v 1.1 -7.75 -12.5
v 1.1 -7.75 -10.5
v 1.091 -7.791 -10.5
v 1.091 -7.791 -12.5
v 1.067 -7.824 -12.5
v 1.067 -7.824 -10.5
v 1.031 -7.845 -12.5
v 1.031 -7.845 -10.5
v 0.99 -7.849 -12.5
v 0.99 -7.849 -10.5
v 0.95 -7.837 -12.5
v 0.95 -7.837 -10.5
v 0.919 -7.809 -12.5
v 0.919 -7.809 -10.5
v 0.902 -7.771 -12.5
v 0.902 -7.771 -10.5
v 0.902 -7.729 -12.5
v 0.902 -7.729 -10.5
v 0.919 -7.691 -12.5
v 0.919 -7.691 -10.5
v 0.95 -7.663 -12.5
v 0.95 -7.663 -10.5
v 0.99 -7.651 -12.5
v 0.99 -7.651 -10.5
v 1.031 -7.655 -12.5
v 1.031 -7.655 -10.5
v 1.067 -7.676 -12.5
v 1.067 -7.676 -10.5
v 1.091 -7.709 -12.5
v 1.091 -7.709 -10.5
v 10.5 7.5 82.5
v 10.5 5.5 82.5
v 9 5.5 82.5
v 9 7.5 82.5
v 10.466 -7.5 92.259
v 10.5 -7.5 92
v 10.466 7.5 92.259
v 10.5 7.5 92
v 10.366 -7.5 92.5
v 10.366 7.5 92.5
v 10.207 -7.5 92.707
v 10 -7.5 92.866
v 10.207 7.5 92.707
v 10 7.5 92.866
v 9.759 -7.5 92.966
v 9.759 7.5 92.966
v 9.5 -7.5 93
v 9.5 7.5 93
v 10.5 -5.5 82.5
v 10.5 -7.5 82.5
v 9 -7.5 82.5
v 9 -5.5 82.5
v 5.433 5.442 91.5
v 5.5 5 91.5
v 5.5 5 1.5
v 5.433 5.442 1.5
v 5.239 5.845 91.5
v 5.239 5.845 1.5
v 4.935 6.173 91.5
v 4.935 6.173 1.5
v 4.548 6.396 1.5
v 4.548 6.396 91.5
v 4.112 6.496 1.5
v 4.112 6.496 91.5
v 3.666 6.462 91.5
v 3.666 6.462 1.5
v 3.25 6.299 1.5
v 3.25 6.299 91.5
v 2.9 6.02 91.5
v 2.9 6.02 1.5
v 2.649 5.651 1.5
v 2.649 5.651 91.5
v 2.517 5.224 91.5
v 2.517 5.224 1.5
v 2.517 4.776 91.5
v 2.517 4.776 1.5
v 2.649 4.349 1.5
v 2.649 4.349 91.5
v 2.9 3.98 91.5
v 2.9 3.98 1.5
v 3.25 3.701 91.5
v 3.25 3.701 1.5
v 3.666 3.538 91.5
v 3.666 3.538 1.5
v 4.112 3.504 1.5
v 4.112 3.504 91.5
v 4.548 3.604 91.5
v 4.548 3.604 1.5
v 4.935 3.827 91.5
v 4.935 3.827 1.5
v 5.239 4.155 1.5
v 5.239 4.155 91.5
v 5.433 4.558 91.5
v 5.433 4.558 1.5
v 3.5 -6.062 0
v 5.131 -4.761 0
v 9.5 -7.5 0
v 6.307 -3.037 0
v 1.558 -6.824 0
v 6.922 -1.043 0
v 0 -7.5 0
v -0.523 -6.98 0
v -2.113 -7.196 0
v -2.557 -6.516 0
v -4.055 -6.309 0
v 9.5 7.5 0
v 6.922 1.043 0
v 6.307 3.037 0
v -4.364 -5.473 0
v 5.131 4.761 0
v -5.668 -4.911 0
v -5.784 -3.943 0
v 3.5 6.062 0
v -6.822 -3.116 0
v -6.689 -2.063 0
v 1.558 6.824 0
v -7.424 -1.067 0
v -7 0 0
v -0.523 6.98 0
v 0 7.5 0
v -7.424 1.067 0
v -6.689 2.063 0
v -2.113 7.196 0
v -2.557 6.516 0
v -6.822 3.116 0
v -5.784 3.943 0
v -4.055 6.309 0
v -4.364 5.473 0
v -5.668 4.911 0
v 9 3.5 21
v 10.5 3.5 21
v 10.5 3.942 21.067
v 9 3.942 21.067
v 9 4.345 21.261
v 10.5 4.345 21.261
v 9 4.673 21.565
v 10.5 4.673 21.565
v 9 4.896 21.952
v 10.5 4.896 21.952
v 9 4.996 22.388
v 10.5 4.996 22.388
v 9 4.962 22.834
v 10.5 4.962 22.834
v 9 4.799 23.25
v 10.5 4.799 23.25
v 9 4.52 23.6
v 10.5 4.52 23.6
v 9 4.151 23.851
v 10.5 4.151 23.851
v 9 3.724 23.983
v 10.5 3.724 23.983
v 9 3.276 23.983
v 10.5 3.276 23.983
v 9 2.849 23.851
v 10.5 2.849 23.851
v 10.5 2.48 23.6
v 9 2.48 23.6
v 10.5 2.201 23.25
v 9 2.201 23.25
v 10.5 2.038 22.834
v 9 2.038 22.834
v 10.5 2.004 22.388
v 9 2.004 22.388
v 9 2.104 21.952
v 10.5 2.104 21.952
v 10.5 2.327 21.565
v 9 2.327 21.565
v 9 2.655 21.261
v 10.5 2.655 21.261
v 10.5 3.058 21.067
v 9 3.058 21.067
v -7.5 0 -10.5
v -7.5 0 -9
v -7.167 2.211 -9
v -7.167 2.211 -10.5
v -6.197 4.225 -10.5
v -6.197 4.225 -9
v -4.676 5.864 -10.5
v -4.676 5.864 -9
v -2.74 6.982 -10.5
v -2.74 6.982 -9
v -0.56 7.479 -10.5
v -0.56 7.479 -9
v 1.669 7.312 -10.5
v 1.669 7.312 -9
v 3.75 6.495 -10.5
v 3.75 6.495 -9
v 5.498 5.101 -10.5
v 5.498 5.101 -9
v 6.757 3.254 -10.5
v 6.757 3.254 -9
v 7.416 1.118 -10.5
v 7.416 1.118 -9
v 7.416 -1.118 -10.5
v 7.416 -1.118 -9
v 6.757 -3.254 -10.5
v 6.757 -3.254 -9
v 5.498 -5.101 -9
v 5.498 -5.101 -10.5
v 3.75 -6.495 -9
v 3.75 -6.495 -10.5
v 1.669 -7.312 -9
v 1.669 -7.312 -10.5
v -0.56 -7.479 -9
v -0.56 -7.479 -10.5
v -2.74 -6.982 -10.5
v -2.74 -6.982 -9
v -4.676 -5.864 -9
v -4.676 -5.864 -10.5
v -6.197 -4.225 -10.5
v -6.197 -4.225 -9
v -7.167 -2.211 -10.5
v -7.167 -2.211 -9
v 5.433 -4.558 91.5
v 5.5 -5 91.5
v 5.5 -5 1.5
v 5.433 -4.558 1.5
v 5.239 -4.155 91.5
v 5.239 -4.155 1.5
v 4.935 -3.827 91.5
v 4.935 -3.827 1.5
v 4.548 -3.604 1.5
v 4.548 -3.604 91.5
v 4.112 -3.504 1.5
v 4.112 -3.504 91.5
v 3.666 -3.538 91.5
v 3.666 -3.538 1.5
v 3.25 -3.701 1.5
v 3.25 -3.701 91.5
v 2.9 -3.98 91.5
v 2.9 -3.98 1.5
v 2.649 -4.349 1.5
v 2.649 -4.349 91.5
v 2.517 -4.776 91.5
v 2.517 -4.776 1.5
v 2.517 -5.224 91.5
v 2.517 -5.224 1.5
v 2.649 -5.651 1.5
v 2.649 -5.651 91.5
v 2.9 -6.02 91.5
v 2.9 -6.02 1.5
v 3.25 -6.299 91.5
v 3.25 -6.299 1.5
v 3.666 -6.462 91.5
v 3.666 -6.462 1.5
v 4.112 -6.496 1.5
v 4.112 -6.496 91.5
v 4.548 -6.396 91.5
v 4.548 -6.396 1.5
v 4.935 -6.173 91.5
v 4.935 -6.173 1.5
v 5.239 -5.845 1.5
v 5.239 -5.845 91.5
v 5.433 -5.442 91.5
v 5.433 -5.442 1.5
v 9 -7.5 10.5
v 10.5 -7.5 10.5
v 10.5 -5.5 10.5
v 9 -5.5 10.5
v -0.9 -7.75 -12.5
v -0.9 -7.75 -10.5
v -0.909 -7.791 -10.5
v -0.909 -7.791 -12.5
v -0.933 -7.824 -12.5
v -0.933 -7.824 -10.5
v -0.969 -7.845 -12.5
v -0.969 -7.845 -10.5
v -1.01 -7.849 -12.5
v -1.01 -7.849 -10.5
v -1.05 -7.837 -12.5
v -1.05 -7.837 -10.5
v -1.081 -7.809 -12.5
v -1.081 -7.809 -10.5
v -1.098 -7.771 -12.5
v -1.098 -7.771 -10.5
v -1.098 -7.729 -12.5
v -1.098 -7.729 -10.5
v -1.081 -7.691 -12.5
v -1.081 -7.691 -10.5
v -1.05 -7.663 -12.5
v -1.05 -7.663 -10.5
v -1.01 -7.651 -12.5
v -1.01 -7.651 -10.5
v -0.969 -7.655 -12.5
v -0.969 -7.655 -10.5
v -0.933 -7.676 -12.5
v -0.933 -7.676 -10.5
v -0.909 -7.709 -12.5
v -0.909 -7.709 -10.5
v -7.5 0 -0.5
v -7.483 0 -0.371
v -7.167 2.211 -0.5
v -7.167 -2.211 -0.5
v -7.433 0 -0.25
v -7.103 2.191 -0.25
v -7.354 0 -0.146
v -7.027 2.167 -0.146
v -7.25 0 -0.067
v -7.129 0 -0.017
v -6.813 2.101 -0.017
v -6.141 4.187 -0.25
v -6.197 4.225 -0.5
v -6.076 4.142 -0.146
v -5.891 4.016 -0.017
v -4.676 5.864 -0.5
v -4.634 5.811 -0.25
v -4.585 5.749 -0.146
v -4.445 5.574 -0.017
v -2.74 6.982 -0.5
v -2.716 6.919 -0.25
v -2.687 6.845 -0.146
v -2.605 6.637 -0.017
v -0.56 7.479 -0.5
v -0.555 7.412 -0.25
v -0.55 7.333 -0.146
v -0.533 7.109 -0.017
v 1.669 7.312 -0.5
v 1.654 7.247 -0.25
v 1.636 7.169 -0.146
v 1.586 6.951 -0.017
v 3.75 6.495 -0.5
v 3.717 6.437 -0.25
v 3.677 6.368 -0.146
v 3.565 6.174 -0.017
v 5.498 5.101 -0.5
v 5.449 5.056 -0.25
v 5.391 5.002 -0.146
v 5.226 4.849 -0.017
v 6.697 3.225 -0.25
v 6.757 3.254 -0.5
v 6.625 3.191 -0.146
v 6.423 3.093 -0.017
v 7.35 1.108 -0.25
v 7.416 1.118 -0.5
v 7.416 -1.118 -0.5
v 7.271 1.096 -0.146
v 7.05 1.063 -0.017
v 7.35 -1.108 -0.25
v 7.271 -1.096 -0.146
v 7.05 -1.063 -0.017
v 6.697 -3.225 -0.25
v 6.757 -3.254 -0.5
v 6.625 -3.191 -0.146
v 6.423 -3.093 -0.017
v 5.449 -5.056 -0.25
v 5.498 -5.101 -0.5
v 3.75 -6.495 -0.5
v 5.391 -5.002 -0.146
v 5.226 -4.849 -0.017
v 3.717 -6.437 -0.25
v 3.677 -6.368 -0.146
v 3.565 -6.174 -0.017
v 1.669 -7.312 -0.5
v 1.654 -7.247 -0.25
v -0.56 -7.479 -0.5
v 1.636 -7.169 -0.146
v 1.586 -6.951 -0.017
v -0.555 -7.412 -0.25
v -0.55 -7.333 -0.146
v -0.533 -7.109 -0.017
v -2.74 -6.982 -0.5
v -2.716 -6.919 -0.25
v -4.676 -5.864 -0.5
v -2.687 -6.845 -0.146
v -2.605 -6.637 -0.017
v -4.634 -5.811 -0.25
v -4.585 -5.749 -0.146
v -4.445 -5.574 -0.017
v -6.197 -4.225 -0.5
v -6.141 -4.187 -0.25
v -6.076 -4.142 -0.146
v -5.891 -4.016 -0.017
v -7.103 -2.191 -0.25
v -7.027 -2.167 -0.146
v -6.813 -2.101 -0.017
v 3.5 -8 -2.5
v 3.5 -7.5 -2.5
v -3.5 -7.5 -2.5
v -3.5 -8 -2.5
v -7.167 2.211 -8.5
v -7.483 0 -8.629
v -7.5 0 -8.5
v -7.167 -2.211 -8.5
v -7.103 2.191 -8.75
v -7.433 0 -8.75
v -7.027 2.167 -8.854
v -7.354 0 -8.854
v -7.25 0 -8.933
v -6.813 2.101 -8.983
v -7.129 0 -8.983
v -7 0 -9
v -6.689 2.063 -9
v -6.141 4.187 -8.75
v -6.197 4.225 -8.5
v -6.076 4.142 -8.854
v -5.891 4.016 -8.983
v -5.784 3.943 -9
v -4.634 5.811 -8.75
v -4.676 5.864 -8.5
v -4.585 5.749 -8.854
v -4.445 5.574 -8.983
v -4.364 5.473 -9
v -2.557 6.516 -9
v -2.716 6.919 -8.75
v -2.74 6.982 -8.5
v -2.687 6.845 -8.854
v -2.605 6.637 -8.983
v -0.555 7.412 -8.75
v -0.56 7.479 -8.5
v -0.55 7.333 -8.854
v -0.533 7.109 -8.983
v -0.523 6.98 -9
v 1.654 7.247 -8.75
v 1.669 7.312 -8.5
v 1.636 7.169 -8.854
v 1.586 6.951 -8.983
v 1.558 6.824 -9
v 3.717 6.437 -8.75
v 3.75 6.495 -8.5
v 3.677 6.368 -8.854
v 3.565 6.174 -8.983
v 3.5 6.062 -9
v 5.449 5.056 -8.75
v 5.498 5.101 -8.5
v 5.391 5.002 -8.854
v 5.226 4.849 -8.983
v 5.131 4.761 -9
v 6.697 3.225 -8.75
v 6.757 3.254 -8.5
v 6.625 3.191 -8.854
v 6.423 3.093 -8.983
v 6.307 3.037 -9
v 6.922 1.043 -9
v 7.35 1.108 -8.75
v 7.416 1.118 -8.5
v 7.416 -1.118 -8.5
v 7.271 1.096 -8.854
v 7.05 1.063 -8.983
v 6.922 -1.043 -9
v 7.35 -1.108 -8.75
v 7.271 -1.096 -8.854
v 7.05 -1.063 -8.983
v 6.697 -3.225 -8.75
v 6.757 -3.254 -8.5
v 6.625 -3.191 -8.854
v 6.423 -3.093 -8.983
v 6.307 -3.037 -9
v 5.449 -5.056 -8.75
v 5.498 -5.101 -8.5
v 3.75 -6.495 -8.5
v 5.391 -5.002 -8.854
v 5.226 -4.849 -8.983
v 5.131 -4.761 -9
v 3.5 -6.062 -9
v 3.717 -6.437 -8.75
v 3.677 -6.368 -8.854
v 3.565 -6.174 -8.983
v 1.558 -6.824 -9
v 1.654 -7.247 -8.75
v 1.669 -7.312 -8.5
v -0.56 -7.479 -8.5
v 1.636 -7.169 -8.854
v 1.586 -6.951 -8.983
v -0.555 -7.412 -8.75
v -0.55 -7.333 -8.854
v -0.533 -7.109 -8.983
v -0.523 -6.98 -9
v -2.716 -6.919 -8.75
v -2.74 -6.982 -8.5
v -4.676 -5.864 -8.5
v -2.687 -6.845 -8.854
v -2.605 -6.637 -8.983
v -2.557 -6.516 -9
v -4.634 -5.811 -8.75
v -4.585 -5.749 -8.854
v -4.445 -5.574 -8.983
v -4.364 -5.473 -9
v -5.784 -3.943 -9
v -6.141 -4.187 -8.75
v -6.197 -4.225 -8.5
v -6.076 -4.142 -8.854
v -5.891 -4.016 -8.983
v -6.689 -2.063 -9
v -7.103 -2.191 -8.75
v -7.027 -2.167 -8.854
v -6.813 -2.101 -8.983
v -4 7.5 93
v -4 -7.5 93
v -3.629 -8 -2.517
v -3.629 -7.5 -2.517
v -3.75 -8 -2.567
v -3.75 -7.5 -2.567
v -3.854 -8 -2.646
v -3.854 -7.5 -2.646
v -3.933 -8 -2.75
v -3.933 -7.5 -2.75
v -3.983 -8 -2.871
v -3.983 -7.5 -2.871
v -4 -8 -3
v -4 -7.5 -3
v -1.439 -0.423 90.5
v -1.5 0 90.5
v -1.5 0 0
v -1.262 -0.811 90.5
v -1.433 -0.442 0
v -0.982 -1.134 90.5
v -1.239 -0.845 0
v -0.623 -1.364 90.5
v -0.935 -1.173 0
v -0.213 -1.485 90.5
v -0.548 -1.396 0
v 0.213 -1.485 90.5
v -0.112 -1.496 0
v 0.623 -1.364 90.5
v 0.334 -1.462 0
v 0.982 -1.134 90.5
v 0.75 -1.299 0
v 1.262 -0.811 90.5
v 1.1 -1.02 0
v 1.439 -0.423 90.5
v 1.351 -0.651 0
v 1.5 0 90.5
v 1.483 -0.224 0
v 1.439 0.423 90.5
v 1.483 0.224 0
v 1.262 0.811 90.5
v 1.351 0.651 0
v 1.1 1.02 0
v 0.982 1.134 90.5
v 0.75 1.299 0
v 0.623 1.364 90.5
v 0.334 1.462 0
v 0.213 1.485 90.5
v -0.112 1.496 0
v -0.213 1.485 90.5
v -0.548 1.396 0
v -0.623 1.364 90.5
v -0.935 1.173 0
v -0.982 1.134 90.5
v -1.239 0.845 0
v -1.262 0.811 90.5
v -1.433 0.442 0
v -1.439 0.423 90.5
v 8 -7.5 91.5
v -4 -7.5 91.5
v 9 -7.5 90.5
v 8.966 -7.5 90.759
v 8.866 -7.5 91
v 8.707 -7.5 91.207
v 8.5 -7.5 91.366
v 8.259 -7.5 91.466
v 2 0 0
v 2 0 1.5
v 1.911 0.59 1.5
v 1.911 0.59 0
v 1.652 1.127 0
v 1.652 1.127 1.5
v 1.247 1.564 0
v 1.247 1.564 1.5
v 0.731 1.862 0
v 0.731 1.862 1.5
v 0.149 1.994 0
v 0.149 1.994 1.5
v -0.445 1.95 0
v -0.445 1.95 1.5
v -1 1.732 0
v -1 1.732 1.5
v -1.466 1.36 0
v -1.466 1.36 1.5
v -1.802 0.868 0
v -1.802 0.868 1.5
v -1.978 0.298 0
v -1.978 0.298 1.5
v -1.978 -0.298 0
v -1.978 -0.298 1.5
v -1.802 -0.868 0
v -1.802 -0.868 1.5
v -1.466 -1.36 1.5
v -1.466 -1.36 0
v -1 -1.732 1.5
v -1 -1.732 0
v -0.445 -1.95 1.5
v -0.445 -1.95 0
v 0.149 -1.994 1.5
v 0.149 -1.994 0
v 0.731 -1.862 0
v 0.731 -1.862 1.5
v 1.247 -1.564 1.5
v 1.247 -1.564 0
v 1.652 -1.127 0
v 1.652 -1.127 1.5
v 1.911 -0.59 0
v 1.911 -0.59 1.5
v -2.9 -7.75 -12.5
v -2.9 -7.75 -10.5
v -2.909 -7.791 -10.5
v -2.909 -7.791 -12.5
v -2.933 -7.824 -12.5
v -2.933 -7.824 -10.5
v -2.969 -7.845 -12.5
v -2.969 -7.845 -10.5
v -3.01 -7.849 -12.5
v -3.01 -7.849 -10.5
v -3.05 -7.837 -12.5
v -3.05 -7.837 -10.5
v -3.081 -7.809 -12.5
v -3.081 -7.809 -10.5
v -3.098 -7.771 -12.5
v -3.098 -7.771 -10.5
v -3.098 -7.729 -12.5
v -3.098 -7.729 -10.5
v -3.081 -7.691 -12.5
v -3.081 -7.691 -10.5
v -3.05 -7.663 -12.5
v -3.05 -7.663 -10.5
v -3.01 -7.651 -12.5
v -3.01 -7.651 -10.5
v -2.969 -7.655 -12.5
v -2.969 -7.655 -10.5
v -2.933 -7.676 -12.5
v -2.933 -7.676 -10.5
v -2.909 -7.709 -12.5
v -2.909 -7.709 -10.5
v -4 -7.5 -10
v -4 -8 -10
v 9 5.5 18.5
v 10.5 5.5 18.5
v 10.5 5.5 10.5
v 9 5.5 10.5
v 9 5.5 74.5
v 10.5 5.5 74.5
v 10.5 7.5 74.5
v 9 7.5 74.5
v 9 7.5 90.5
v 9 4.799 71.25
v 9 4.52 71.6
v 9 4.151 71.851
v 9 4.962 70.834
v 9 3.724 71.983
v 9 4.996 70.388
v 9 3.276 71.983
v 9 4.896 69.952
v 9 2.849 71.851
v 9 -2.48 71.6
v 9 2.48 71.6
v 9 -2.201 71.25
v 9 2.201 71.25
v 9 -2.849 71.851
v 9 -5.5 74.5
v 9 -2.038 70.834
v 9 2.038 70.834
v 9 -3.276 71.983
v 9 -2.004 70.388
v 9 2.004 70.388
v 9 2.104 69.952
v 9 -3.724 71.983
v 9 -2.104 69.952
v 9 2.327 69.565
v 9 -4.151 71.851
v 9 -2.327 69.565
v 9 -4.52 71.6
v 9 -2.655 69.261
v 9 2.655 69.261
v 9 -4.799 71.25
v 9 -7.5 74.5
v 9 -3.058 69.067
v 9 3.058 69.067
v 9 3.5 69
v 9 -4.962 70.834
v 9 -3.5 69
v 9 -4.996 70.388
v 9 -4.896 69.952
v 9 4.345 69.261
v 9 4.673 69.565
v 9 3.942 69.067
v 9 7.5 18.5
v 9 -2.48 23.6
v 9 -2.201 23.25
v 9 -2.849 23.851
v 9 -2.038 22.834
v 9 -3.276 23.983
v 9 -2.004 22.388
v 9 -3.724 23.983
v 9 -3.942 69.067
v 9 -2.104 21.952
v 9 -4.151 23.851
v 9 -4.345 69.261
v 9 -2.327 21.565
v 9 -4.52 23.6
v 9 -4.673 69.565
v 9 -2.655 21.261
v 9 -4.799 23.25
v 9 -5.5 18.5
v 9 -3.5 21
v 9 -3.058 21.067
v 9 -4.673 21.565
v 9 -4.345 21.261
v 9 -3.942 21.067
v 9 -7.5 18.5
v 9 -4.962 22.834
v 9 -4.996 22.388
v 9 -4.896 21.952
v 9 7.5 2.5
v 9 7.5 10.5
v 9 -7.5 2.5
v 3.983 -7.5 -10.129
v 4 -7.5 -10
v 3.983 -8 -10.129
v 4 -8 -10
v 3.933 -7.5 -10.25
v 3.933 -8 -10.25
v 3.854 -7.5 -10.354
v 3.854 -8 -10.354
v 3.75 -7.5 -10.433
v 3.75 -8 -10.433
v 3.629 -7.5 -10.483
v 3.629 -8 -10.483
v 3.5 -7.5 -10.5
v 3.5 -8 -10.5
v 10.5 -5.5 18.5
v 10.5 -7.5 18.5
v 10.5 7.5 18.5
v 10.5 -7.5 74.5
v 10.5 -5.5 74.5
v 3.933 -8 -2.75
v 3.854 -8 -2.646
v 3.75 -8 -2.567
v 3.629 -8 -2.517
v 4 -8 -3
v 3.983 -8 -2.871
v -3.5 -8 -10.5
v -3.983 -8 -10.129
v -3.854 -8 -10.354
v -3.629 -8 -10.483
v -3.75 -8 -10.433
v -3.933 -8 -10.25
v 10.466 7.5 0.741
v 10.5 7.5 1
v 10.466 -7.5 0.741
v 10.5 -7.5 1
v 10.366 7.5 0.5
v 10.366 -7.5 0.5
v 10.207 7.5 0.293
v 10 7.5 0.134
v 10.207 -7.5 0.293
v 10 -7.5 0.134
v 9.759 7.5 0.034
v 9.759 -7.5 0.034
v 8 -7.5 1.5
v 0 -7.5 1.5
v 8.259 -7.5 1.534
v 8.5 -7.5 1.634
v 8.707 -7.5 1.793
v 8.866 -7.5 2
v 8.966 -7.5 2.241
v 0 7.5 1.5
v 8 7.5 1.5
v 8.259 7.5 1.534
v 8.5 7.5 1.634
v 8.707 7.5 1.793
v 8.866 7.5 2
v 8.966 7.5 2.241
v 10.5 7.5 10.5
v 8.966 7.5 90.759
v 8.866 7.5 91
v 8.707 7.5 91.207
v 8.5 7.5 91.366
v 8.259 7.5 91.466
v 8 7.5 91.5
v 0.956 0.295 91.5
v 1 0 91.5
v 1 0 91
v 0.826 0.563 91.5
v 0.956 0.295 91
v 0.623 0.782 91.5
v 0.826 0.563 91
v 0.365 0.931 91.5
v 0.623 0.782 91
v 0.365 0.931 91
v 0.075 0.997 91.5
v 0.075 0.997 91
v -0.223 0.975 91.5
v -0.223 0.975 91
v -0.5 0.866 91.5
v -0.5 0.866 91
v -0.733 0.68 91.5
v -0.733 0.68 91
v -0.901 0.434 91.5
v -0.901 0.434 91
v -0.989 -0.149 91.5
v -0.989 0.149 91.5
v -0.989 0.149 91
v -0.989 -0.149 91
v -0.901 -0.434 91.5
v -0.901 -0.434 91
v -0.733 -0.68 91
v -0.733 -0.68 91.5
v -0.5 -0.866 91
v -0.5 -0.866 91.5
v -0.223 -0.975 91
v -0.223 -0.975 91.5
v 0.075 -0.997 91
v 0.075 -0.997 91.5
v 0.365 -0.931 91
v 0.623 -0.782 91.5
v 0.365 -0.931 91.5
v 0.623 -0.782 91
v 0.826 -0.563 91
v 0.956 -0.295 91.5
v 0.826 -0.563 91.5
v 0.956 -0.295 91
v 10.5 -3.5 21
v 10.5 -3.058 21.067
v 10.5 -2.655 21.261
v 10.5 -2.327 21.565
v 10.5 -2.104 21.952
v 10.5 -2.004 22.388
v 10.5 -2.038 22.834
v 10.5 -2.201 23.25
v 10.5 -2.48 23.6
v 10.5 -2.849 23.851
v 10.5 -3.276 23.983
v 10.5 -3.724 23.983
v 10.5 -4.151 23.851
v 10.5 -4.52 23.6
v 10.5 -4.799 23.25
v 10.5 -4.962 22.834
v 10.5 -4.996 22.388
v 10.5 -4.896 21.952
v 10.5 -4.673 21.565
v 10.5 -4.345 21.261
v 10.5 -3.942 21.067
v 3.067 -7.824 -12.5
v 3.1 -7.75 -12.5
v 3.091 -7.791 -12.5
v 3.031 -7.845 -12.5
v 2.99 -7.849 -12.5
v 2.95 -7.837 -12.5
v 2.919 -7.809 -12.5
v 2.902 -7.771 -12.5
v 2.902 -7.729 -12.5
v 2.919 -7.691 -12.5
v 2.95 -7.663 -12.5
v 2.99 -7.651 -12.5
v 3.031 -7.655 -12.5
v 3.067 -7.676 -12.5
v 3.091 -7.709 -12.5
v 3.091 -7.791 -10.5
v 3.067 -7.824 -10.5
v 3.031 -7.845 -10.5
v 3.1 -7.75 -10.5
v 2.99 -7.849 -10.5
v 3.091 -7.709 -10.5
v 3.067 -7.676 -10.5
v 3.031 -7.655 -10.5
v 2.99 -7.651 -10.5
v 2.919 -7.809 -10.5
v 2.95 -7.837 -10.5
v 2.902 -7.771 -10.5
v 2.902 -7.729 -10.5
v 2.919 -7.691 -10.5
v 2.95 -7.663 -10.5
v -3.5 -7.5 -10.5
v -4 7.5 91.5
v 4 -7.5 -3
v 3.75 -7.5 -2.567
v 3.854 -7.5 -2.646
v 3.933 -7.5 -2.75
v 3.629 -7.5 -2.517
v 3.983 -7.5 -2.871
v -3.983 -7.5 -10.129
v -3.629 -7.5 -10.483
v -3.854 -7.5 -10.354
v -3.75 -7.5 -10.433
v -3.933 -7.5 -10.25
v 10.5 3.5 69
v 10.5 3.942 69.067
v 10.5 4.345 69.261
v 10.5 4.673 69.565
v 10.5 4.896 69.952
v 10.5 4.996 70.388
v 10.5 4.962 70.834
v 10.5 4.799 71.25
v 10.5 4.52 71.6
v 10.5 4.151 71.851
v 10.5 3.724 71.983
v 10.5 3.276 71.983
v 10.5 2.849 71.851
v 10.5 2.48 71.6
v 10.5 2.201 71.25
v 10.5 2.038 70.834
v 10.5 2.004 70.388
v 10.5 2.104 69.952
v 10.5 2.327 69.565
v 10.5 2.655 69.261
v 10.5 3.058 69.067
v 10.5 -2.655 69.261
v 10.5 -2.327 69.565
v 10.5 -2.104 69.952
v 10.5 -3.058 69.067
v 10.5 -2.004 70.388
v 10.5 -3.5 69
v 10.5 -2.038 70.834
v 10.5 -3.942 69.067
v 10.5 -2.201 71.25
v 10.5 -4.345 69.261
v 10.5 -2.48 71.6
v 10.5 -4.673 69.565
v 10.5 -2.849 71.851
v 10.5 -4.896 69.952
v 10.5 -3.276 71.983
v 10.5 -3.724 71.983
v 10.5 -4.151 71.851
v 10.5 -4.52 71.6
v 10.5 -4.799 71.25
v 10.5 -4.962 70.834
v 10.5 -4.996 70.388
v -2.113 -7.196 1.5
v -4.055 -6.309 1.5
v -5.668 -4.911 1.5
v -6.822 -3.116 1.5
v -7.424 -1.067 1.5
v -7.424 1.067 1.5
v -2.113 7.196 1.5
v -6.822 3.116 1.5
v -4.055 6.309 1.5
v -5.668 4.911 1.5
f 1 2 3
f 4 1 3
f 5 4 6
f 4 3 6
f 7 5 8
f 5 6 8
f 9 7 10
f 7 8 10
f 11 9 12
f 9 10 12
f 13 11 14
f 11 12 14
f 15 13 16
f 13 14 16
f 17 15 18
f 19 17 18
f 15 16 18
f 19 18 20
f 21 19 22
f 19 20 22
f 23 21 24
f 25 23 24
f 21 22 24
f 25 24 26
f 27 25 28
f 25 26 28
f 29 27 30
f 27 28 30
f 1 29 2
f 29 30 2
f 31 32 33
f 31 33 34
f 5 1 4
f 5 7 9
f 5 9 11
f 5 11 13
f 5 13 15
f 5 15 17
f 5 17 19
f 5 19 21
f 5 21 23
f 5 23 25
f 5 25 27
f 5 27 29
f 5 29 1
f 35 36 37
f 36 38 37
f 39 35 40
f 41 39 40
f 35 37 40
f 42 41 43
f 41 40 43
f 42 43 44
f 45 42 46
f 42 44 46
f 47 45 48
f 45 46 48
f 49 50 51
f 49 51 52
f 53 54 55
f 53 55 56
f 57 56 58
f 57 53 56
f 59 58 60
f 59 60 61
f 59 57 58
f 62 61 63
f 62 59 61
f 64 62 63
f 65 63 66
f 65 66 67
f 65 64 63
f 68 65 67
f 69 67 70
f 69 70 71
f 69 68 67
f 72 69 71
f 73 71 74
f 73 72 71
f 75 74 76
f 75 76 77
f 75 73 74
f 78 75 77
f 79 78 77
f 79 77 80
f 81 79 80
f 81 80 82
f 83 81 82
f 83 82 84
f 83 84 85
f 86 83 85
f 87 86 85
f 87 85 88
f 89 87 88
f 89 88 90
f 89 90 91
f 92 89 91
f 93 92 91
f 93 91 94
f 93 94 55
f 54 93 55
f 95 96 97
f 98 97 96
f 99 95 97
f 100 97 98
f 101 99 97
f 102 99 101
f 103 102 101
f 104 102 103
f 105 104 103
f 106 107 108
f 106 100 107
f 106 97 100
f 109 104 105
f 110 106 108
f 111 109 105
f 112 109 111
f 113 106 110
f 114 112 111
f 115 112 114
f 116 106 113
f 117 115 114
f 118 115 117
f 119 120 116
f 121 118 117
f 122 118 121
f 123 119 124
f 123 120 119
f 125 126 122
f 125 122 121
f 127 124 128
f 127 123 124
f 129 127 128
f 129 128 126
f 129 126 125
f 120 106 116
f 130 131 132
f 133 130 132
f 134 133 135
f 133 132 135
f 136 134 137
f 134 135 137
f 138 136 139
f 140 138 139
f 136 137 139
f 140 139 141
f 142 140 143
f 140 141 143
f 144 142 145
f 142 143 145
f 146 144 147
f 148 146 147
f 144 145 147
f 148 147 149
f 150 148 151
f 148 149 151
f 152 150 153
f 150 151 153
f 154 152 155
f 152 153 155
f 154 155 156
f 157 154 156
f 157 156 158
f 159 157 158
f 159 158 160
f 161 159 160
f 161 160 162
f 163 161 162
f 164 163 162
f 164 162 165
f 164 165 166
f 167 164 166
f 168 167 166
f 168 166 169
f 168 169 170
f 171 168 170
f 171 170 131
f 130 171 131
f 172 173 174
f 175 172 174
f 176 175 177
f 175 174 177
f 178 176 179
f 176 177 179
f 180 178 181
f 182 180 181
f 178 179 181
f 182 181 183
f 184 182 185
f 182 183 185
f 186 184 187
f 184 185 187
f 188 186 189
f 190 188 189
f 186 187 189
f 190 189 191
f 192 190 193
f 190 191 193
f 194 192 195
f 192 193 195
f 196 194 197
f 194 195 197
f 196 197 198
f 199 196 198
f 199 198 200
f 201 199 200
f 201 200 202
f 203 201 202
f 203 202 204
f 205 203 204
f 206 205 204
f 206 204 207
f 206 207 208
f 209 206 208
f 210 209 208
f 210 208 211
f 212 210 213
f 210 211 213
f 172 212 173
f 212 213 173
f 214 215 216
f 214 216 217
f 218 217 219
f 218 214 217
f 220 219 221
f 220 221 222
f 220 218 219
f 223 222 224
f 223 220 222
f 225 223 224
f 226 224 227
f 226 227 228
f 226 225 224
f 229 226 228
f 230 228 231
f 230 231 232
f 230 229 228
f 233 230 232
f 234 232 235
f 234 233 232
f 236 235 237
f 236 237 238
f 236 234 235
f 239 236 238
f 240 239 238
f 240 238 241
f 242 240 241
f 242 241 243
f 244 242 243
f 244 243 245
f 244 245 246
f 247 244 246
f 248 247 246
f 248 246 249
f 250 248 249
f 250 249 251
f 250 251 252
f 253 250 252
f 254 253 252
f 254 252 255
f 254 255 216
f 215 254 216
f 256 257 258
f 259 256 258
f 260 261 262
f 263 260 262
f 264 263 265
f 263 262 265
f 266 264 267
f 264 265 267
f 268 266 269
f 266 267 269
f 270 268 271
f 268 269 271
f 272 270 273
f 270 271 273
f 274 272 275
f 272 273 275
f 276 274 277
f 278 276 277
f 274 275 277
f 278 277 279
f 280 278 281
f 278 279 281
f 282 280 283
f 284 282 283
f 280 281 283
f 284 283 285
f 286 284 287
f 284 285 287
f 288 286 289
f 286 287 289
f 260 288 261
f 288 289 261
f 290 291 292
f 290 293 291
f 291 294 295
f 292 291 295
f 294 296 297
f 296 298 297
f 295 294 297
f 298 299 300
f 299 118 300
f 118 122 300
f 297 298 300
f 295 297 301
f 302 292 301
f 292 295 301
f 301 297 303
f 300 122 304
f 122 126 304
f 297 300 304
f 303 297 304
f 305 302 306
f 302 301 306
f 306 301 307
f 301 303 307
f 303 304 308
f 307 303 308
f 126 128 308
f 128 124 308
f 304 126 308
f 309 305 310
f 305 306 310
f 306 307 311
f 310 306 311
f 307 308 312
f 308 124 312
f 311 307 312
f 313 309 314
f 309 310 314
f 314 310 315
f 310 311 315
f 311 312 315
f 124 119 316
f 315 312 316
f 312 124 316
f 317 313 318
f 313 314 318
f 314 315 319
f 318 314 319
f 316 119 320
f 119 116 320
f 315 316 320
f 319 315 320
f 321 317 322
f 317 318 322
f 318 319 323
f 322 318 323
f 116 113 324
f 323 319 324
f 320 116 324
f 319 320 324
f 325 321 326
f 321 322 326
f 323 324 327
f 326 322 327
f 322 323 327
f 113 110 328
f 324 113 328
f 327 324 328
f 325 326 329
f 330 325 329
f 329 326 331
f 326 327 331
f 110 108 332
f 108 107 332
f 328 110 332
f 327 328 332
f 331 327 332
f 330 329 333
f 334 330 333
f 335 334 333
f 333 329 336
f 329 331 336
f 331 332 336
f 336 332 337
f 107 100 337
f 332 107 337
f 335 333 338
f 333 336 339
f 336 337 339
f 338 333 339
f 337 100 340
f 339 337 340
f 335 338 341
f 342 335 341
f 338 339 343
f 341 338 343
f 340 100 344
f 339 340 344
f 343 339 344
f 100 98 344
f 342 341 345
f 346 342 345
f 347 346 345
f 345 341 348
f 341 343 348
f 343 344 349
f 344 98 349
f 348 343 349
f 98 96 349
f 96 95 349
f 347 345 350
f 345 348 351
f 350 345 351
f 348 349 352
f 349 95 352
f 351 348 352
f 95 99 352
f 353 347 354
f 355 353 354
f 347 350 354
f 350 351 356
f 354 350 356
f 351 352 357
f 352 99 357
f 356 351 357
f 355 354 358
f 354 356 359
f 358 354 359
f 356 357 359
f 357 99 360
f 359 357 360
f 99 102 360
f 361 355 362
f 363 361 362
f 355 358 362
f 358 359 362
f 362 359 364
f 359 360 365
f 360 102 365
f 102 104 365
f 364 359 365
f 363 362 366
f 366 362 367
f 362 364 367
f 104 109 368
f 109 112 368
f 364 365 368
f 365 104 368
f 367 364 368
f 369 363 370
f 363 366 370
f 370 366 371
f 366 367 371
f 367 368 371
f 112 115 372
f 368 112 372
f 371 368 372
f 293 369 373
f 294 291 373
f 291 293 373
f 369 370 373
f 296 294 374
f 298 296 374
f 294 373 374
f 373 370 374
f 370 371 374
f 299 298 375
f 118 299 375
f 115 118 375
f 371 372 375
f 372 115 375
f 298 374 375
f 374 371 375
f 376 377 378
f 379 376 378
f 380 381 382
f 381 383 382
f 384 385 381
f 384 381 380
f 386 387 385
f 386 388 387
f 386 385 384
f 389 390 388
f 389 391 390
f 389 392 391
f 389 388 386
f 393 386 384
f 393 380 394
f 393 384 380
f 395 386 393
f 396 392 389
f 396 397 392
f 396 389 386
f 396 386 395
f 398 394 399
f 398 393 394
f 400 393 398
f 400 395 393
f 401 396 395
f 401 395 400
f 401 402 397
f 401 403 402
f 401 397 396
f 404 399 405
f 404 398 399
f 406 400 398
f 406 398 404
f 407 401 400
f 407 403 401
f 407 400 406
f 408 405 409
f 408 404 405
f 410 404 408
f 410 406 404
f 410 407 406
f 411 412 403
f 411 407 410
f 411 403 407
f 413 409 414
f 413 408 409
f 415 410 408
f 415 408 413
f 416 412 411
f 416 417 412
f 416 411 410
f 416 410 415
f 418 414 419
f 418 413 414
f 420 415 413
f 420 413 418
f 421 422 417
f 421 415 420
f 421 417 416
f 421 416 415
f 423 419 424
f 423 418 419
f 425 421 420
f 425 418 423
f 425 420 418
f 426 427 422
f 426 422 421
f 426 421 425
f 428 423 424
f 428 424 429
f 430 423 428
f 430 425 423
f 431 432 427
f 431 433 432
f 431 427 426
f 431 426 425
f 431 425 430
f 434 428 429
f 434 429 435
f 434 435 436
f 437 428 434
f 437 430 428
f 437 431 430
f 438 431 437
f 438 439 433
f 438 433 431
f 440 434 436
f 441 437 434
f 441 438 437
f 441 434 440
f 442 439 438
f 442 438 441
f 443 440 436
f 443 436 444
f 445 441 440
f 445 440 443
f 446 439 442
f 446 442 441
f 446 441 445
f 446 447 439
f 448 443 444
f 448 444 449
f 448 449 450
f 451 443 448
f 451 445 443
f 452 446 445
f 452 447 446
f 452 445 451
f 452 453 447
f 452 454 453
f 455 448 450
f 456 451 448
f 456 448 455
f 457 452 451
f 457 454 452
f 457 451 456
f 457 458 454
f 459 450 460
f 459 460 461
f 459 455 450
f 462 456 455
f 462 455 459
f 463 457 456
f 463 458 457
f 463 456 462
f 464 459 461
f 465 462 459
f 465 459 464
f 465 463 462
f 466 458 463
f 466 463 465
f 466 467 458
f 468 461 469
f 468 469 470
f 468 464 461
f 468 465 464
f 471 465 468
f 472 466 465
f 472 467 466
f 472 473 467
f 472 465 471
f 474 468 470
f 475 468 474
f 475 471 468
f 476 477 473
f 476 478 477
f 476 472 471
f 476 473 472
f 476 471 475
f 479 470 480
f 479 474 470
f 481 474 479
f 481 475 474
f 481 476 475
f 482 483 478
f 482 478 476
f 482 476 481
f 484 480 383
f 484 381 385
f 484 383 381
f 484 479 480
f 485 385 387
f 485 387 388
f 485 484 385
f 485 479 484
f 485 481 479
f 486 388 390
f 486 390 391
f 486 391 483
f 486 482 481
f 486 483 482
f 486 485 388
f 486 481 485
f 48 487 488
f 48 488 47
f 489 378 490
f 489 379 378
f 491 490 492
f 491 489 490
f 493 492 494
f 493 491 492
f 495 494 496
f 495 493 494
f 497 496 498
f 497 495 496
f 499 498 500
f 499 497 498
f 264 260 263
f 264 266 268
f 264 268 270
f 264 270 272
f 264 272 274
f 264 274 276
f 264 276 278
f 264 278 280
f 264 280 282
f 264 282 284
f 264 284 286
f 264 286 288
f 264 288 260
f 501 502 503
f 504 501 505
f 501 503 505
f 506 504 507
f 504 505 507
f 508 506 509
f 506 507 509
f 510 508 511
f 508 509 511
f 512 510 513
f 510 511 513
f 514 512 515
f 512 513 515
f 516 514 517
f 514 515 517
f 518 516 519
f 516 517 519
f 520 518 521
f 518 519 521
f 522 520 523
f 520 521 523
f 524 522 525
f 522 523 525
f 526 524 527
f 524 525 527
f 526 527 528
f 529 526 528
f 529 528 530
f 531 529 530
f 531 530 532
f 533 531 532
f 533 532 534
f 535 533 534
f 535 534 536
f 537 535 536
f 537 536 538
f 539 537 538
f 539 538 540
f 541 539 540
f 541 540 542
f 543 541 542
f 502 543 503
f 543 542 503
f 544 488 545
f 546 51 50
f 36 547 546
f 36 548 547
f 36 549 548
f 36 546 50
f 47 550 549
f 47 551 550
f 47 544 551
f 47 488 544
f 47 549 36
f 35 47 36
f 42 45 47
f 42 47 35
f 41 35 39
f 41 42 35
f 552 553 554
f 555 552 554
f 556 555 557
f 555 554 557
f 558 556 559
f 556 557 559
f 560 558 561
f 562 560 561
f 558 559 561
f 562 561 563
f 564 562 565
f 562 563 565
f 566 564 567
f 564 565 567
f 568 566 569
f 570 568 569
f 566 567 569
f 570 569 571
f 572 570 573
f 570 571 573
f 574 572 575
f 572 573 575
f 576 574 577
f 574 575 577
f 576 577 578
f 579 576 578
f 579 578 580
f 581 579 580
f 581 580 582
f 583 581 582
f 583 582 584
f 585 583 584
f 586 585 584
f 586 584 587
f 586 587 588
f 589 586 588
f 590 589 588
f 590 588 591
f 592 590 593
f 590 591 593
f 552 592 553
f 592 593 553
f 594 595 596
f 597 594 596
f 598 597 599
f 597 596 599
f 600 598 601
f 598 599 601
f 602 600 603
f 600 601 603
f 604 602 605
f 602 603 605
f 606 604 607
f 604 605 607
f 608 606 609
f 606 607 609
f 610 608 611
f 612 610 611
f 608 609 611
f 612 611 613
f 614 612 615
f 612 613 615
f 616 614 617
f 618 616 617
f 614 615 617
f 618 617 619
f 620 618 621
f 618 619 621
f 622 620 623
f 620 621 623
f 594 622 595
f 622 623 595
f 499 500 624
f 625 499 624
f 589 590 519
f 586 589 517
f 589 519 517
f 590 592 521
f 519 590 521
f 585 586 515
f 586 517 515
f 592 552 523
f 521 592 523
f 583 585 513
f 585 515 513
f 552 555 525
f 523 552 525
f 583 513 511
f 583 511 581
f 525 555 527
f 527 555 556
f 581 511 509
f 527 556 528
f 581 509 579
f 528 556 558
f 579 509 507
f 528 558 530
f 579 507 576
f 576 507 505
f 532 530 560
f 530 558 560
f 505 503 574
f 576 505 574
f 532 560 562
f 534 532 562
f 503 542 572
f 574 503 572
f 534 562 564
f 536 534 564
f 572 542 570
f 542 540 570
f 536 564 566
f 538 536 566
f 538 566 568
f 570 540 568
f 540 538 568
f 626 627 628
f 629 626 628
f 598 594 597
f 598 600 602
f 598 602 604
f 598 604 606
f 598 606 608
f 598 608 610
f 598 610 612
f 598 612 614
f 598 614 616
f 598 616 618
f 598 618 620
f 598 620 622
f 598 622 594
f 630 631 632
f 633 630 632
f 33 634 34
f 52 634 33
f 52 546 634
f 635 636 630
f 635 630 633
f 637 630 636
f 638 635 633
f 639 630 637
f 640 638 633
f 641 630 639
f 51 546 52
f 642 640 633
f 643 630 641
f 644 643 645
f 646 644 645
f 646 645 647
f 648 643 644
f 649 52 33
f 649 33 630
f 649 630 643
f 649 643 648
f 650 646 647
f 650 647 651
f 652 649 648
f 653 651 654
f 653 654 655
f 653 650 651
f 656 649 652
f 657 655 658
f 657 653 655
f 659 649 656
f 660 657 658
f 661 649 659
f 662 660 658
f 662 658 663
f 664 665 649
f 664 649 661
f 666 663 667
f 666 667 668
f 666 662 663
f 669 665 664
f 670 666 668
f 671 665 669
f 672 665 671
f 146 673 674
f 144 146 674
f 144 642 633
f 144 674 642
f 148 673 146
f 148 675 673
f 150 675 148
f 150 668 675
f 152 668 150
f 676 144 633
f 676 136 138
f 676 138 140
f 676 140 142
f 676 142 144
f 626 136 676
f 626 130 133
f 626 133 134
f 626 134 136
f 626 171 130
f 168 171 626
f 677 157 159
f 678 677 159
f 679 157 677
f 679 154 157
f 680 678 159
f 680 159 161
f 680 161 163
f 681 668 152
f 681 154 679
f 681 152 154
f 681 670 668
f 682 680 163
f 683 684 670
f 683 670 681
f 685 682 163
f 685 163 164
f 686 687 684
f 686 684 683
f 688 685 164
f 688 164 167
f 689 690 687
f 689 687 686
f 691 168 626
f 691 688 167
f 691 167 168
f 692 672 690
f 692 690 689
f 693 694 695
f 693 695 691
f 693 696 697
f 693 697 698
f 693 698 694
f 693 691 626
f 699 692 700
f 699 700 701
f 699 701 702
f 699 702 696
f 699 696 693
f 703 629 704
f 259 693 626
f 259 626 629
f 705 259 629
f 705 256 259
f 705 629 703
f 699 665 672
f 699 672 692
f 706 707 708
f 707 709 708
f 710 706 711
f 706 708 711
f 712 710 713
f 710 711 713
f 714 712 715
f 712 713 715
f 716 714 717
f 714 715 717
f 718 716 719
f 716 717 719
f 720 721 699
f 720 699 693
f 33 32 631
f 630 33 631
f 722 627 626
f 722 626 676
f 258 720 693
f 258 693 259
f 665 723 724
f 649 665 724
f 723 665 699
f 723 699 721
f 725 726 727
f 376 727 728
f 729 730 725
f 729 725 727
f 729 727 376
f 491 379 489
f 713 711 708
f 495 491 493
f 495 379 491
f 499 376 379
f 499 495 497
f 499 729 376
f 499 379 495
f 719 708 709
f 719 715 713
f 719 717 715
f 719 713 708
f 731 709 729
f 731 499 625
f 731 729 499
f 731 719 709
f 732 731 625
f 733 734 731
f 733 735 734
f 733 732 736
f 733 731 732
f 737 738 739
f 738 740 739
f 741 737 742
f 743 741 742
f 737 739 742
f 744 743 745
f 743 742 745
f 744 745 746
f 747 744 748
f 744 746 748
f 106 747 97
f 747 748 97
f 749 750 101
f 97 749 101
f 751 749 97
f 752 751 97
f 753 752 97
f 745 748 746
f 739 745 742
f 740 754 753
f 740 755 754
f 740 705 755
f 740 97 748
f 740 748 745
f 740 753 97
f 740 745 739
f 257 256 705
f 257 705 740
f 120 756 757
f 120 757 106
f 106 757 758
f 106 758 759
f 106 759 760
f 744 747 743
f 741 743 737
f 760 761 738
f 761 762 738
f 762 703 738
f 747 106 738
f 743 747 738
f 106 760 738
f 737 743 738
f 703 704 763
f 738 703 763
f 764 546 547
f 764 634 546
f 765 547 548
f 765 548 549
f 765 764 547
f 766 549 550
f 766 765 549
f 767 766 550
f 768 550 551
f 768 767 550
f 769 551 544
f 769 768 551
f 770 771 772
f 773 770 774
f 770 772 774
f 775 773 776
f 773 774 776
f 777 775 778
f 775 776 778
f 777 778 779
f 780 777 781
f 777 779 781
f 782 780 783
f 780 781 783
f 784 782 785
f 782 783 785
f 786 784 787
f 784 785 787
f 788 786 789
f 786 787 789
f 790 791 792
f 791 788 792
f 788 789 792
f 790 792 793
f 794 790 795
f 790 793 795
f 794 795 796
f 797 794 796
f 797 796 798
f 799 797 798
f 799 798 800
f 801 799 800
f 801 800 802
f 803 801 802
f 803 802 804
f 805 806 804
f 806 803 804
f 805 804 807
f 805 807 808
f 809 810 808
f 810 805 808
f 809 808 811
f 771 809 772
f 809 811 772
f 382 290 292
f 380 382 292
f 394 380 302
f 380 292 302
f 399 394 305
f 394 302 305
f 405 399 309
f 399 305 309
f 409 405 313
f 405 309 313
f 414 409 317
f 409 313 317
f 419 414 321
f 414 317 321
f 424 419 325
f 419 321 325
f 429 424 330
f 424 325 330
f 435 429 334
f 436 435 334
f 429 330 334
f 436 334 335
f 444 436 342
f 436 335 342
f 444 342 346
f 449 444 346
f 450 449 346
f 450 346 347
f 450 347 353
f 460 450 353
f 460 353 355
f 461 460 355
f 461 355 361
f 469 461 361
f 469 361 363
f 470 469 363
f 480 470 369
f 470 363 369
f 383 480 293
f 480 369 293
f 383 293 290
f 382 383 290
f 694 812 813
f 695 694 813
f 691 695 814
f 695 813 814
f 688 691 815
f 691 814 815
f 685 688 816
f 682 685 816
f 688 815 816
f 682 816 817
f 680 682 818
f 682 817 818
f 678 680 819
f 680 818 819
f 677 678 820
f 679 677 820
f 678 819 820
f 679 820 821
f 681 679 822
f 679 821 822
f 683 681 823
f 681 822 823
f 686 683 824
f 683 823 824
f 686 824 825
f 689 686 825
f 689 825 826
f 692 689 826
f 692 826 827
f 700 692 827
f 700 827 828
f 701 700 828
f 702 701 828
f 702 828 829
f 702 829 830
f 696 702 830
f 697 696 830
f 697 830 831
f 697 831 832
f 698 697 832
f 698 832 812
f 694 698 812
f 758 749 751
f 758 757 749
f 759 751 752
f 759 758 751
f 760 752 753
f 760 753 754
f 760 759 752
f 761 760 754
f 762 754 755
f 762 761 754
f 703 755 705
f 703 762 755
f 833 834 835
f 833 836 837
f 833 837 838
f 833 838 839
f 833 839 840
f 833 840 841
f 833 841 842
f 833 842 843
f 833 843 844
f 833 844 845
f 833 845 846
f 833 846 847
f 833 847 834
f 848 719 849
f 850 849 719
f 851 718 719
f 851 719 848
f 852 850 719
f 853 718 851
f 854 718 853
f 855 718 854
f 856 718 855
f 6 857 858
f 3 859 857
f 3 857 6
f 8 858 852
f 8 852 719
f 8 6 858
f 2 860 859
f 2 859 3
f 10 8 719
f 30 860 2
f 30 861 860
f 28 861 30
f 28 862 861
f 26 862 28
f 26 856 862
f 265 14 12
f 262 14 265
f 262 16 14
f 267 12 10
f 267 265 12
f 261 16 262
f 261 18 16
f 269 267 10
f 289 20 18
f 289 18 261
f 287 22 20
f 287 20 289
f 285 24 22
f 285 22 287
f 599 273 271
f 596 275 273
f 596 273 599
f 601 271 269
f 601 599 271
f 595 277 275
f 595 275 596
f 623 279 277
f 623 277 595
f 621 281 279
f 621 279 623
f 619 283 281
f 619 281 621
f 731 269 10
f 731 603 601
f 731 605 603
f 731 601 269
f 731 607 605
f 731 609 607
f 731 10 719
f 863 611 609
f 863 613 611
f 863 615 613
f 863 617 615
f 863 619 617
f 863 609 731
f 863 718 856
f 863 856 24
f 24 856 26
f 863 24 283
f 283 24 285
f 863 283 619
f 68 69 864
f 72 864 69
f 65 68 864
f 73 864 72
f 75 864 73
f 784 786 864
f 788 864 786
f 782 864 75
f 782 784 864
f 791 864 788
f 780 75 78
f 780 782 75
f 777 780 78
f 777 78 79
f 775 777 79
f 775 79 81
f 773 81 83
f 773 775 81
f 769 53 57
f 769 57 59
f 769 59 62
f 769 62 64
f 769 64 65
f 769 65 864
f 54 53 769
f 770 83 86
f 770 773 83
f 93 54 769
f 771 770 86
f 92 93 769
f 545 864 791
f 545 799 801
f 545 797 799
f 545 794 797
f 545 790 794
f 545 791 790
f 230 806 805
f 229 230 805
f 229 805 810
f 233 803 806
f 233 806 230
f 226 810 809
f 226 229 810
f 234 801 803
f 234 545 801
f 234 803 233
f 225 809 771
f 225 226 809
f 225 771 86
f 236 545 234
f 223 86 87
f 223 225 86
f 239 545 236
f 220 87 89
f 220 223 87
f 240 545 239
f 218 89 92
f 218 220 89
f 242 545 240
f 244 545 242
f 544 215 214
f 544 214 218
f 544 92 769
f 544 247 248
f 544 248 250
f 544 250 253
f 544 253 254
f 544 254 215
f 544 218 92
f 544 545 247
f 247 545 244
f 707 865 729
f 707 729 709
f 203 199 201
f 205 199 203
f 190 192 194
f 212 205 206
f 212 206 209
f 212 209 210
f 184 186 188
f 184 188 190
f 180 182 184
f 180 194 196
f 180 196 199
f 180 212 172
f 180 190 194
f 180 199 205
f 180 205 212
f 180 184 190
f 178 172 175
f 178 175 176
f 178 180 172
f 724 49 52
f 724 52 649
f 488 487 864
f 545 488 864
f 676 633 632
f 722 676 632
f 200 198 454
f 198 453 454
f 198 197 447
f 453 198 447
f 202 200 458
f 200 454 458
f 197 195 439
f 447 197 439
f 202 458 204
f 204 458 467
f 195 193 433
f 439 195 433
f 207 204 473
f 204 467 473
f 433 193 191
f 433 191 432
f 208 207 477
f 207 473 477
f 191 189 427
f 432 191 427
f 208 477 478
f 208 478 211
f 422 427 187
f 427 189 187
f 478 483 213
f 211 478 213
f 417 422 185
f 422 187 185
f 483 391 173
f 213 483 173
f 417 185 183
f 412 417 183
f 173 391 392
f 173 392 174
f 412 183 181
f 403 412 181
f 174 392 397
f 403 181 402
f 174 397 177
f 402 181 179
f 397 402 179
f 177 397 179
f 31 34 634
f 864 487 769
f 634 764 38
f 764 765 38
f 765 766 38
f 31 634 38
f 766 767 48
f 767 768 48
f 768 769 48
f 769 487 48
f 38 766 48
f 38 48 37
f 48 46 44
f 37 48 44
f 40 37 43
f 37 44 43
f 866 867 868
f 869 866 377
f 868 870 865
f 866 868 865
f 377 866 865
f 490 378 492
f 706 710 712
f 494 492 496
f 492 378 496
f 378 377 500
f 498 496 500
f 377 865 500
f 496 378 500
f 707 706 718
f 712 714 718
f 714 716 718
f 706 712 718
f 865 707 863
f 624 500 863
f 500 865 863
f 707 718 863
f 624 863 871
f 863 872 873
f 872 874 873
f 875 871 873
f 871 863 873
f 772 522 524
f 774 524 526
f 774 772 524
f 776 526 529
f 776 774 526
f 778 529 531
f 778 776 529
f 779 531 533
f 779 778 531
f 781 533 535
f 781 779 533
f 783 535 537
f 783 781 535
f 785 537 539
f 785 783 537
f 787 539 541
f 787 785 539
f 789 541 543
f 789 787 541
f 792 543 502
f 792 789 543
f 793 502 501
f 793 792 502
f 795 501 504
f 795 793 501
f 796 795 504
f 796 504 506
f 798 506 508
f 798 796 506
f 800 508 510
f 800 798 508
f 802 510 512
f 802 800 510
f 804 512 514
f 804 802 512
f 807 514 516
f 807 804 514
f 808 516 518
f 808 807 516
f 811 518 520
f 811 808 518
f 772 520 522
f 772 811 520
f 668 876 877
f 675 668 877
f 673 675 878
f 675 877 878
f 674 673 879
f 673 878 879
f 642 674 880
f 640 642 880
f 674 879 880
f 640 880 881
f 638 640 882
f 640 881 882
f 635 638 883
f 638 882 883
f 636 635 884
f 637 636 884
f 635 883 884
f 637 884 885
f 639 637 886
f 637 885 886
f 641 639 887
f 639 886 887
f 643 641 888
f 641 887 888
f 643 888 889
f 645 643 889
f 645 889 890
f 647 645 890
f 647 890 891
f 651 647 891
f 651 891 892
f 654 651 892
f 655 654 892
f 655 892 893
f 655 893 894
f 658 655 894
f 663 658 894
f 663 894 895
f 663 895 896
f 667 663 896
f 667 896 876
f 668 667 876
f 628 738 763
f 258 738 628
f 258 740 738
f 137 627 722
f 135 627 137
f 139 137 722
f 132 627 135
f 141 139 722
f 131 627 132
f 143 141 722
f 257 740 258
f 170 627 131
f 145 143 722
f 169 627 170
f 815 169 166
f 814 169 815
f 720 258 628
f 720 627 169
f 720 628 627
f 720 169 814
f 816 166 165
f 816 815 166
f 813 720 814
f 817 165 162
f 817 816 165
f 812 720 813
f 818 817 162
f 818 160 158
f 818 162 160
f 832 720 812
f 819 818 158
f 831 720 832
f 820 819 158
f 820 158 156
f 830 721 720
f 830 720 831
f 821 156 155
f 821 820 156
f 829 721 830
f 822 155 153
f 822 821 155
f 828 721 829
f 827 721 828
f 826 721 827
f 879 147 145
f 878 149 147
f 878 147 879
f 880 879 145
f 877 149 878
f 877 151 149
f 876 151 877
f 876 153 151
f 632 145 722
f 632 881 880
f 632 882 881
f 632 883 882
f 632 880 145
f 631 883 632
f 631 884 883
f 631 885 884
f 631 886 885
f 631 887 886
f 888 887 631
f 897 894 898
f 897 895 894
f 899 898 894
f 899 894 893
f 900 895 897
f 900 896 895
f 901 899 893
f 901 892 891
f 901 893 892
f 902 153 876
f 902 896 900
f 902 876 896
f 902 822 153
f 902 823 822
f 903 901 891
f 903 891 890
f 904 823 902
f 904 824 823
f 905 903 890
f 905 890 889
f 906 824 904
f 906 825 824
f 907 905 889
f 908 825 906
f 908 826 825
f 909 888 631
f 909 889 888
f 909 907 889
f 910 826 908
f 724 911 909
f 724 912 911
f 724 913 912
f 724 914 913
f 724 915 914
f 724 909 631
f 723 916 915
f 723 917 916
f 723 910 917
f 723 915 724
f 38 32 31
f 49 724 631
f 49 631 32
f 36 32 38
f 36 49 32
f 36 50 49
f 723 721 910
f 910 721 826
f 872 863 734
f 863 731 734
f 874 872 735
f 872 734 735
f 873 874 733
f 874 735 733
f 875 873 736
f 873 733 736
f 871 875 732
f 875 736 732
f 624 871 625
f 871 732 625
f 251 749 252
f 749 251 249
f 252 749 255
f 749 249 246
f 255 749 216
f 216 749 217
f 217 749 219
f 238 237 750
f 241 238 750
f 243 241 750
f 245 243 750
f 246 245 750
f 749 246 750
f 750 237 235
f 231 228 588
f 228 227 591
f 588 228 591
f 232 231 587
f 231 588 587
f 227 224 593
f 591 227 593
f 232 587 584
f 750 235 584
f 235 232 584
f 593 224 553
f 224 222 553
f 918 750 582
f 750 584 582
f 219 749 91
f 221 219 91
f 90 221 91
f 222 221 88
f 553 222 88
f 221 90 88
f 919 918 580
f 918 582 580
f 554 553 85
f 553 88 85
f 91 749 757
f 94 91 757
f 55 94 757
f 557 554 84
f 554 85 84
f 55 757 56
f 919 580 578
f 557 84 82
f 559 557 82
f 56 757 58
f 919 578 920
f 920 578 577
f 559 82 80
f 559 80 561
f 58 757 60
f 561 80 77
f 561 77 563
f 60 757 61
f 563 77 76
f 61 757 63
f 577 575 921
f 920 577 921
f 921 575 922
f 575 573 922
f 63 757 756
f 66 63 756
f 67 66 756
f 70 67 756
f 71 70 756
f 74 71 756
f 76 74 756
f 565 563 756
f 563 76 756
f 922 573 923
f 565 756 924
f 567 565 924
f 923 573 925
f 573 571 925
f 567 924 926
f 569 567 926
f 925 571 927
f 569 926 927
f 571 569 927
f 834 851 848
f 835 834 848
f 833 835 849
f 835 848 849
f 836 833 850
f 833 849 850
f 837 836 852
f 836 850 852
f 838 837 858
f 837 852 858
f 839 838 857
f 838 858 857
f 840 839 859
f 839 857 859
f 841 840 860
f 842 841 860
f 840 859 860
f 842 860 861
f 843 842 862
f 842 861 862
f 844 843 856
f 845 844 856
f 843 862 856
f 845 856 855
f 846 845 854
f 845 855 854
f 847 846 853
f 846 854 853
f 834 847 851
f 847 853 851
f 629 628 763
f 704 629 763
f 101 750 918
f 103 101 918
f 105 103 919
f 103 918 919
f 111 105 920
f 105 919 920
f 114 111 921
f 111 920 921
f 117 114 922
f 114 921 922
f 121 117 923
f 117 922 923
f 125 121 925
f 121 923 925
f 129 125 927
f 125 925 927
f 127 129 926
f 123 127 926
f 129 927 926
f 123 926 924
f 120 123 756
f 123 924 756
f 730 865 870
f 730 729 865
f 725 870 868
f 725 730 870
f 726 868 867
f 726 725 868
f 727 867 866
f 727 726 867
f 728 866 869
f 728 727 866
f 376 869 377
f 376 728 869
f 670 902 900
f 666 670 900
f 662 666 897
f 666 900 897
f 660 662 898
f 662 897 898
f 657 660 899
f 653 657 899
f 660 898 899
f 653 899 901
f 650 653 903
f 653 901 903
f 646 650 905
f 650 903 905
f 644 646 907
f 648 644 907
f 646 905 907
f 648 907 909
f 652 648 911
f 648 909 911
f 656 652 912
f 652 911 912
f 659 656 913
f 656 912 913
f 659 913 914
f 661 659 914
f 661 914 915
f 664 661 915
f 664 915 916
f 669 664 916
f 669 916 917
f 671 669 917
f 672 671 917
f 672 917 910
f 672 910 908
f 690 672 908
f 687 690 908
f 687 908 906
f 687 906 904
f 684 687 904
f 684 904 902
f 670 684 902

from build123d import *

# Parameters (mm, degrees)
SKETCH_1_R          = 1.5
EXTRUDE_1_DEPTH     = 90
SKETCH_2_R          = 1
EXTRUDE_2_DEPTH     = 3
CHAMFER_1_SIZE      = 1
SKETCH_3_R          = 7.5
EXTRUDE_3_DEPTH     = 9
FILLET_1_R          = 0.5
EXTRUDE_START       = 1.5
SKETCH_4_R          = 2
EXTRUDE_4_DEPTH     = 1.5
SKETCH_5_R          = 7.5
EXTRUDE_5_DEPTH     = 1.5
EXTRUDE_6_DEPTH     = 15
FILLET_2_R          = 1
SKETCH_8_W          = 8
SKETCH_8_H          = 2
SKETCH_8_R          = 1.5
CUT_EXTRUDE_1_DEPTH = 3
SKETCH_9_R          = 1.5
EXTRUDE_7_DEPTH     = 91.5
SKETCH_10_W         = 8
SKETCH_10_H         = 8
EXTRUDE_8_DEPTH     = 0.5
SKETCH_12_R         = 0.1
EXTRUDE_9_DEPTH     = 2
FILLET_3_R          = 0.5


with BuildPart() as part:
    # 草图1 → 凸台-拉伸1 (new body)
    with BuildSketch(Plane.XY):
        with Locations(Location((0, 0, 0), (0, 0, 180))):
            Circle(SKETCH_1_R)
    extrude(amount=EXTRUDE_1_DEPTH)

    # 草图2 → 凸台-拉伸2 (add)
    with BuildSketch(Plane.XY.offset(90)):
        Circle(SKETCH_2_R)
    extrude(amount=EXTRUDE_2_DEPTH)

    # 倒角1
    # the kernel refuses this chamfer: 1 mm, written as the material it adds along each edge
    with BuildSketch(Plane(origin=(0, 0, 90), x_dir=(1, 0, 0), z_dir=(0, -1, 0))) as chamfer_1_piece_1_section:
        Polygon((1 + CHAMFER_1_SIZE, 0), (1, CHAMFER_1_SIZE), (1, 0), align=None)
    chamfer_1_piece_1 = revolve(axis=Axis((0, 0, 90), (0, 0, 1)), mode=Mode.PRIVATE)
    chamfer_1_piece_1 = chamfer_1_piece_1 & Plane(origin=(0, 0, 90.753826293), x_dir=(-1, 0, 0), z_dir=(0, 0, -1)) * Cylinder(1.5, 8, mode=Mode.PRIVATE)
    add(chamfer_1_piece_1)

    # 草图3 → 凸台-拉伸3 (add)
    with BuildSketch(Plane(origin=(0, 0, 0), x_dir=(-1, 0, 0), z_dir=(0, 0, -1))):
        Circle(SKETCH_3_R)
    extrude(amount=EXTRUDE_3_DEPTH)

    # 圆角1
    fillet_1_edges = [part.edges().sort_by_distance(p)[0] for p in [
        (7.5, 0, 0),
        (7.5, 0, -9),
    ]]
    fillet(fillet_1_edges, radius=FILLET_1_R)

    # 草图4 → 凸台-拉伸4 (add)
    with BuildSketch(Plane.XY.offset(EXTRUDE_START)):
        with BuildLine():
            Line((0, 7.5), (10.5, 7.5))
            Line((10.5, 7.5), (10.5, -7.5))
            Line((10.5, -7.5), (0, -7.5))
            ThreePointArc((0, -7.5), (-7.5, 0), (0, 7.5))
        make_face()
        Circle(SKETCH_4_R, mode=Mode.SUBTRACT)
    extrude(amount=-EXTRUDE_4_DEPTH)

    # 草图5 → 凸台-拉伸5 (add)
    with BuildSketch(Plane(origin=(0, 0, -9), x_dir=(-1, 0, 0), z_dir=(0, 0, -1))):
        Circle(SKETCH_5_R)
    extrude(amount=EXTRUDE_5_DEPTH)

    # 草图7 → 凸台-拉伸6 (add)
    with BuildSketch(Plane.XZ.offset(7.5)):
        Polygon((10.5, 1.5), (10.5, 93), (-4, 93), (-4, 91.5), (9, 91.5), (9, 1.5), align=None)
    extrude(amount=-EXTRUDE_6_DEPTH)

    # 圆角2
    fillet_2_edges = [part.edges().sort_by_distance(p)[0] for p in [
        (10.5, 0, 0),
        (9, 0, 1.5),
        (9, 0, 91.5),
        (10.5, 0, 93),
    ]]
    fillet(fillet_2_edges, radius=FILLET_2_R)

    # 草图8 → 切除-拉伸1 (cut)
    with BuildSketch(Plane(origin=(10.5, 0, 0), x_dir=(0, 0, -1), z_dir=(1, 0, 0))):
        with Locations((-78.5, -6.5)):
            Rectangle(SKETCH_8_W, SKETCH_8_H)
        with Locations((-78.5, 6.5)):
            Rectangle(SKETCH_8_W, SKETCH_8_H)
        with Locations((-70.5, -3.5)):
            Circle(SKETCH_8_R)
        with Locations((-70.5, 3.5)):
            Circle(SKETCH_8_R)
        with Locations((-22.5, -3.5)):
            Circle(SKETCH_8_R)
        with Locations((-14.5, -6.5)):
            Rectangle(SKETCH_8_W, SKETCH_8_H)
        with Locations((-14.5, 6.5)):
            Rectangle(SKETCH_8_W, SKETCH_8_H)
        with Locations((-22.5, 3.5)):
            Circle(SKETCH_8_R)
    extrude(amount=-CUT_EXTRUDE_1_DEPTH, mode=Mode.SUBTRACT)

    # 草图9 → 凸台-拉伸7 (add)
    with BuildSketch(Plane.XY.offset(93)):
        with Locations((4, -5)):
            Circle(SKETCH_9_R)
        with Locations((4, 5)):
            Circle(SKETCH_9_R)
    extrude(amount=-EXTRUDE_7_DEPTH)


with BuildPart() as body_2:
    # 草图10 → 凸台-拉伸8 (new body)
    with BuildSketch(Plane(origin=(0, -7.5, 0), x_dir=(-1, 0, 0), z_dir=(0, -1, 0))):
        with Locations((0, 6.5)):
            Rectangle(SKETCH_10_W, SKETCH_10_H)
    extrude(amount=EXTRUDE_8_DEPTH)

    # 草图12 → 凸台-拉伸9 (add)
    with BuildSketch(Plane(origin=(0, 0, -10.5), x_dir=(-1, 0, 0), z_dir=(0, 0, -1))):
        with Locations(Location((1, -7.75, 0), (0, 0, 180))):
            Circle(SKETCH_12_R)
        with Locations(Location((3, -7.75, 0), (0, 0, 180))):
            Circle(SKETCH_12_R)
        with Locations(Location((-1, -7.75, 0), (0, 0, 180))):
            Circle(SKETCH_12_R)
        with Locations(Location((-3, -7.75, 0), (0, 0, 180))):
            Circle(SKETCH_12_R)
    extrude(amount=EXTRUDE_9_DEPTH)

    # 圆角3
    fillet_3_edges = [body_2.edges().sort_by_distance(p)[0] for p in [
        (4, -7.75, -10.5),
        (-4, -7.75, -10.5),
        (-4, -7.75, -2.5),
        (4, -7.75, -2.5),
    ]]
    fillet(fillet_3_edges, radius=FILLET_3_R)


solid = Compound([part.part, body_2.part])
